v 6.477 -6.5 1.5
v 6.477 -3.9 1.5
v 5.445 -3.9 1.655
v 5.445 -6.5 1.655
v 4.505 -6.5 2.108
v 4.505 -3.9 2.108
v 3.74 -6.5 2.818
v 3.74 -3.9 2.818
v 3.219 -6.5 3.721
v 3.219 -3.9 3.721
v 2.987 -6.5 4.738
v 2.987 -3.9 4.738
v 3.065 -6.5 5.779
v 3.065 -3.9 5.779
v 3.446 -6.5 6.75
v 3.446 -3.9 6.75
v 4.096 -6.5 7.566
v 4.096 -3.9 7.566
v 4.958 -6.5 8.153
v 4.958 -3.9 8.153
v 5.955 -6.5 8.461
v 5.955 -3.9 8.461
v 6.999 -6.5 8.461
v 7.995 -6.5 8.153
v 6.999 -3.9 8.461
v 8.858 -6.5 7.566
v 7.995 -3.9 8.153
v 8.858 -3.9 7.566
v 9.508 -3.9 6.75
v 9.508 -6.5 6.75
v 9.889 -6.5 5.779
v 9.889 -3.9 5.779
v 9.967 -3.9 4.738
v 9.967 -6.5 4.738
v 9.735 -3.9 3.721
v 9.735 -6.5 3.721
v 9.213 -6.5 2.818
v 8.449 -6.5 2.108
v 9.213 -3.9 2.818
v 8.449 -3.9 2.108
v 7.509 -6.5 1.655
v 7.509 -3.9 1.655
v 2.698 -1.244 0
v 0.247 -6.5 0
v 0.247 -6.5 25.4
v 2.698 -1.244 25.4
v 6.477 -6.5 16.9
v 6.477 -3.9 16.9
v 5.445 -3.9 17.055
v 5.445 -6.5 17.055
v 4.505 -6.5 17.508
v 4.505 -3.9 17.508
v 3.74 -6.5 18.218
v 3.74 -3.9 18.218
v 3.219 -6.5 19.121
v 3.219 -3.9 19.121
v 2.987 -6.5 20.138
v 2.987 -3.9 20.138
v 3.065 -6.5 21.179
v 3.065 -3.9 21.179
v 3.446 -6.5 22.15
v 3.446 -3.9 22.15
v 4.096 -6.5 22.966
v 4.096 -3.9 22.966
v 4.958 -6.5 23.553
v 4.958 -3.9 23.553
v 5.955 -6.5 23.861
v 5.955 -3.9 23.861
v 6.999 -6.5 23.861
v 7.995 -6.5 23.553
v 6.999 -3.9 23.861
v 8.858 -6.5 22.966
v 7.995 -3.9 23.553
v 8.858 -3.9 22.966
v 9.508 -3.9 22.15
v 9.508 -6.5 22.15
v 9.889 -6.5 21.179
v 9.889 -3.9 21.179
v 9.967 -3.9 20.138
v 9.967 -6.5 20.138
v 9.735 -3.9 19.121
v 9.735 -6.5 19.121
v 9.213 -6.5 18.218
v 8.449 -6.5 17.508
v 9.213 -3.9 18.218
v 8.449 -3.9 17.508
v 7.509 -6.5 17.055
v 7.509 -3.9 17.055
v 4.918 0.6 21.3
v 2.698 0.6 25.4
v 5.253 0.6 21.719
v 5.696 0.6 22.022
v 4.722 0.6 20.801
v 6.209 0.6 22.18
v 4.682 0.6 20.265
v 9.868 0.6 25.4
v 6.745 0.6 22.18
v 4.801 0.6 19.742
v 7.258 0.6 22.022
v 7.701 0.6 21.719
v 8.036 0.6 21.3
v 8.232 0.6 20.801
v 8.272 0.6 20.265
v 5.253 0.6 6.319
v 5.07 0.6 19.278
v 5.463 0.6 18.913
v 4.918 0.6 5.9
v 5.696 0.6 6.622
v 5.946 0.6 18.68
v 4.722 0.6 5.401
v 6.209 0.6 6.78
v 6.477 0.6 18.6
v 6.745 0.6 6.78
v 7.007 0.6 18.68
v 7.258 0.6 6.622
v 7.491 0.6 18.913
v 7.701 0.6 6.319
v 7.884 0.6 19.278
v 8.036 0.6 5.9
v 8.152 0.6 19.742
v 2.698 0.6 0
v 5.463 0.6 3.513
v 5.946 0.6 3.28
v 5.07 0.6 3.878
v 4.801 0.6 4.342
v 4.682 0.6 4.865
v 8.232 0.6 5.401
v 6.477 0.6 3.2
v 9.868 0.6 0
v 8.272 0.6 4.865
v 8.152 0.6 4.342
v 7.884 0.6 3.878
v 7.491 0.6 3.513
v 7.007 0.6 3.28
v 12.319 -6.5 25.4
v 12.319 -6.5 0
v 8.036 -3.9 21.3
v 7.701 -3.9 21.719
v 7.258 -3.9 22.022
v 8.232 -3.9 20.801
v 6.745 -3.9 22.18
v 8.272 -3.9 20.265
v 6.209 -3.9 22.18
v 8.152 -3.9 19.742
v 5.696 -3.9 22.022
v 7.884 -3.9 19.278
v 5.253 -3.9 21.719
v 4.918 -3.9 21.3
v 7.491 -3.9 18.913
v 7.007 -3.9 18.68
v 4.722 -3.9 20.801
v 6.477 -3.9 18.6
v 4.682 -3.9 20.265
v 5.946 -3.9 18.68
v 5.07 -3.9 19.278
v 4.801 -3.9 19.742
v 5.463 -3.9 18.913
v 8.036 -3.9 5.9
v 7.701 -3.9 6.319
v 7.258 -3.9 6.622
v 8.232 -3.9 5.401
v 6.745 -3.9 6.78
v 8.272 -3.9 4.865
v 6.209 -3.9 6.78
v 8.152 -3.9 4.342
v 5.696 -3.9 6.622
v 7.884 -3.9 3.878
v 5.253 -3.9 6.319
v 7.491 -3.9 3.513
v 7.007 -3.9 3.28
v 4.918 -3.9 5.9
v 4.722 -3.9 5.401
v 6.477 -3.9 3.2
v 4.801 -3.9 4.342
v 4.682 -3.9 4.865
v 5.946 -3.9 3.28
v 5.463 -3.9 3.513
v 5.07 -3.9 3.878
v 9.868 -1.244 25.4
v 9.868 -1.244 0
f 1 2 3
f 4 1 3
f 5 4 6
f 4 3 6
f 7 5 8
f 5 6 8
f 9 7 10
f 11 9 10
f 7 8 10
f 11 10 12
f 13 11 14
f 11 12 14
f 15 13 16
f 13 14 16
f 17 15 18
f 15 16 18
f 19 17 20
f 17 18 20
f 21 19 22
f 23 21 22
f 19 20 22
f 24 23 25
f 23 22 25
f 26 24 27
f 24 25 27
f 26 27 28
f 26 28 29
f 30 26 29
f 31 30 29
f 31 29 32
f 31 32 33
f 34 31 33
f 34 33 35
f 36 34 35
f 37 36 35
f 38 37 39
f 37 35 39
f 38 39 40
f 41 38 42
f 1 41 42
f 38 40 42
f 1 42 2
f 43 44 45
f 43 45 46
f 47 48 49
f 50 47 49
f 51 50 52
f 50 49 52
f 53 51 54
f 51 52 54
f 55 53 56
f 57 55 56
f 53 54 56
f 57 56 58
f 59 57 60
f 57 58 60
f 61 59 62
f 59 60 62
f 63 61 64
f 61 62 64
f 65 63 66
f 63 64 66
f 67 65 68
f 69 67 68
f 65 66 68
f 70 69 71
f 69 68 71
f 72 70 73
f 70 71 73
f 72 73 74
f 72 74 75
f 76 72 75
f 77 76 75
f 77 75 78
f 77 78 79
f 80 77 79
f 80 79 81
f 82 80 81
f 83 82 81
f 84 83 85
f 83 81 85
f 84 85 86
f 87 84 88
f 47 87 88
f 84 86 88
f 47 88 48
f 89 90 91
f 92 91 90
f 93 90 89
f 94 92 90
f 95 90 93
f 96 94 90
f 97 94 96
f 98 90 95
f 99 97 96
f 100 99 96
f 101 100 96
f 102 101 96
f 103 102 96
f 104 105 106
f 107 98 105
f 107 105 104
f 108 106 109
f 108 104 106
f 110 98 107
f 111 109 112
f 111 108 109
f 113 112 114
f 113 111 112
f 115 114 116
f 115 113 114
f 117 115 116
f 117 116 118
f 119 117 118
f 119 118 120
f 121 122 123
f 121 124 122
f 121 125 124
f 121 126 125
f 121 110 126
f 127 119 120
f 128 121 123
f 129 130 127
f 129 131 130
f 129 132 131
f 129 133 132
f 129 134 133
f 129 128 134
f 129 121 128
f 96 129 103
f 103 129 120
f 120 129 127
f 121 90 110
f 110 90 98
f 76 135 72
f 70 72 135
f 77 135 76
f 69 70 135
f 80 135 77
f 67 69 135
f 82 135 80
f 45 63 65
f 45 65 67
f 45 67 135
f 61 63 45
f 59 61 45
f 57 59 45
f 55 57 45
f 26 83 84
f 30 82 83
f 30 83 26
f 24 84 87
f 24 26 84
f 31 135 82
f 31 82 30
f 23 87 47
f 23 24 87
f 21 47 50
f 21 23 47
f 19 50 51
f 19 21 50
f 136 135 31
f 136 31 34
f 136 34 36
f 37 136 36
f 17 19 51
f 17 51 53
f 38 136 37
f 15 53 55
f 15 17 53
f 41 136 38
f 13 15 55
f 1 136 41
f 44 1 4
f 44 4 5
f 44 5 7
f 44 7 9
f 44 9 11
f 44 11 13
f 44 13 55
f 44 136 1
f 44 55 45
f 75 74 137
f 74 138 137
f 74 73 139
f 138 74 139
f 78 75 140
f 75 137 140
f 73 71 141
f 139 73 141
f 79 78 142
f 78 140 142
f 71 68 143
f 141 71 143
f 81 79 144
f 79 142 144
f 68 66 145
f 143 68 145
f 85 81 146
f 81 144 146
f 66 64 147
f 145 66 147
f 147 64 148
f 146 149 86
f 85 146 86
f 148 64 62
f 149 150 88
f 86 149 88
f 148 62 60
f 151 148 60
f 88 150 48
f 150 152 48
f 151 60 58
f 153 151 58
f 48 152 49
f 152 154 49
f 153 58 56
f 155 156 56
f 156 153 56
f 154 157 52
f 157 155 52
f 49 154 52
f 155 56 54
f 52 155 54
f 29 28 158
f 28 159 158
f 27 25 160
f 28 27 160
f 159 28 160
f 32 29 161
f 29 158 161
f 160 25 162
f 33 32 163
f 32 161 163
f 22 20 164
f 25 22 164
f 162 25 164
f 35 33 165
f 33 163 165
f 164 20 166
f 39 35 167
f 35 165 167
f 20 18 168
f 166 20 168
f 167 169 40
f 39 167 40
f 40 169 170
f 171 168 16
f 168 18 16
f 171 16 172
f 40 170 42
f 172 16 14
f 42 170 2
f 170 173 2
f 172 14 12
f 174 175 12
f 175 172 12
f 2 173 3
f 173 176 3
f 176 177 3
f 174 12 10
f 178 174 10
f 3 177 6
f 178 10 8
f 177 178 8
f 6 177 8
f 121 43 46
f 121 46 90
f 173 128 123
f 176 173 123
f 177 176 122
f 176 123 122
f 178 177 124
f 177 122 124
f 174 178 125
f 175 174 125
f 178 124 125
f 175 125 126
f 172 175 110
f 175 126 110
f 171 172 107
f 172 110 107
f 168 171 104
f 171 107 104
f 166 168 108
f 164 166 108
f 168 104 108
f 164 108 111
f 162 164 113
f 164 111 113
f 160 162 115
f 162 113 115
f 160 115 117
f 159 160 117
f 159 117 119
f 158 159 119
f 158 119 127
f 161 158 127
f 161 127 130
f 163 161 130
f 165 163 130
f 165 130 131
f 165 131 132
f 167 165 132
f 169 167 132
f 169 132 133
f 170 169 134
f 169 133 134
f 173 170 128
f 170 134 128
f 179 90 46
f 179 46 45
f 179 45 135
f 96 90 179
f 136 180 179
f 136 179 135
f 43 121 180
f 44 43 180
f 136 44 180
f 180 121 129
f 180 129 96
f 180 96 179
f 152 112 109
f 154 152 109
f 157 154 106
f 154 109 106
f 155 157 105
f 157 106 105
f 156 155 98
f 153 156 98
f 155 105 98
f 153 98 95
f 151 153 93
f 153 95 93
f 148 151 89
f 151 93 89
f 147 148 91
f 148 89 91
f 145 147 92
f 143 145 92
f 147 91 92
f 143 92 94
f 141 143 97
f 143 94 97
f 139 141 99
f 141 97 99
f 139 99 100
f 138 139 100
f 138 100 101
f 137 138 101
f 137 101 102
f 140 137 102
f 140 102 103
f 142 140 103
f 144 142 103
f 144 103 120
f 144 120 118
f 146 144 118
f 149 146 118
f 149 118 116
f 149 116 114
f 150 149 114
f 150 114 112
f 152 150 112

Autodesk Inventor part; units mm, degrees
ref_plane "YZ Plane" through (0, 0, 0) normal (1, 0, 0) x (0, 1, 0)
ref_plane "XZ Plane" through (0, 0, 0) normal (0, 1, 0) x (-1, 0, 0)
ref_plane "XY Plane" through (0, 0, 0) normal (0, 0, 1) x (1, 0, 0)
sketch "Sketch1" plane through (0, 0, 0) normal (0, 0, 1) x (1, 0, 0)
  line L0 (12.6328, -6.7) -> (10.0681, -1.2)
  line L1 (-0.0672, -6.7) -> (2.4975, -1.2)
  line L2 (-0.0672, -6.7) -> (12.6328, -6.7)
  line L3 (10.0681, 0.8) -> (2.4975, 0.8)
  line L4 (2.4975, -1.2) -> (2.4975, 0.8)
  line L5 (10.0681, -1.2) -> (10.0681, 0.8)
  line L6 (2.6975, 0.6) -> (9.8681, 0.6)
  line L7 (9.8681, 0.6) -> (9.8681, -1.2443)
  line L8 (9.8681, -1.2443) -> (12.3189, -6.5)
  line L9 (12.3189, -6.5) -> (0.2468, -6.5)
  line L10 (0.2468, -6.5) -> (2.6975, -1.2443)
  line L11 (2.6975, -1.2443) -> (2.6975, 0.6)
  line L12 (6.2828, 2.7247) -> (6.2828, -9.3147) construction
  point P0 (0, 0)
  point P1 (19.05, 0)
  point P2 (0, 0)
  dimension "d20" = 12.7
  dimension "d22" = 5.5
  dimension "d23" = 5.5
  dimension "d24" = 2
  dimension "d25" = 2
  dimension "d28" = 0.2
  dimension "d29" = 155
  dimension "d31" = 155
extrude "Extrusion1" add sketch "Sketch1" along normal blind 25.4 contours L6 L7 L8 L9 L10 L11
hole "Hole1" at (6.4769, -6.5, 20.4) direction (0, 1, 0) diameter 3.6 end through all counterbore diameter 7 counterbore depth 2.6
hole "Hole2" at (6.4769, -6.5, 5) direction (0, 1, 0) diameter 3.6 end through all counterbore diameter 7 counterbore depth 2.6
properties part number "Wall_mount"
